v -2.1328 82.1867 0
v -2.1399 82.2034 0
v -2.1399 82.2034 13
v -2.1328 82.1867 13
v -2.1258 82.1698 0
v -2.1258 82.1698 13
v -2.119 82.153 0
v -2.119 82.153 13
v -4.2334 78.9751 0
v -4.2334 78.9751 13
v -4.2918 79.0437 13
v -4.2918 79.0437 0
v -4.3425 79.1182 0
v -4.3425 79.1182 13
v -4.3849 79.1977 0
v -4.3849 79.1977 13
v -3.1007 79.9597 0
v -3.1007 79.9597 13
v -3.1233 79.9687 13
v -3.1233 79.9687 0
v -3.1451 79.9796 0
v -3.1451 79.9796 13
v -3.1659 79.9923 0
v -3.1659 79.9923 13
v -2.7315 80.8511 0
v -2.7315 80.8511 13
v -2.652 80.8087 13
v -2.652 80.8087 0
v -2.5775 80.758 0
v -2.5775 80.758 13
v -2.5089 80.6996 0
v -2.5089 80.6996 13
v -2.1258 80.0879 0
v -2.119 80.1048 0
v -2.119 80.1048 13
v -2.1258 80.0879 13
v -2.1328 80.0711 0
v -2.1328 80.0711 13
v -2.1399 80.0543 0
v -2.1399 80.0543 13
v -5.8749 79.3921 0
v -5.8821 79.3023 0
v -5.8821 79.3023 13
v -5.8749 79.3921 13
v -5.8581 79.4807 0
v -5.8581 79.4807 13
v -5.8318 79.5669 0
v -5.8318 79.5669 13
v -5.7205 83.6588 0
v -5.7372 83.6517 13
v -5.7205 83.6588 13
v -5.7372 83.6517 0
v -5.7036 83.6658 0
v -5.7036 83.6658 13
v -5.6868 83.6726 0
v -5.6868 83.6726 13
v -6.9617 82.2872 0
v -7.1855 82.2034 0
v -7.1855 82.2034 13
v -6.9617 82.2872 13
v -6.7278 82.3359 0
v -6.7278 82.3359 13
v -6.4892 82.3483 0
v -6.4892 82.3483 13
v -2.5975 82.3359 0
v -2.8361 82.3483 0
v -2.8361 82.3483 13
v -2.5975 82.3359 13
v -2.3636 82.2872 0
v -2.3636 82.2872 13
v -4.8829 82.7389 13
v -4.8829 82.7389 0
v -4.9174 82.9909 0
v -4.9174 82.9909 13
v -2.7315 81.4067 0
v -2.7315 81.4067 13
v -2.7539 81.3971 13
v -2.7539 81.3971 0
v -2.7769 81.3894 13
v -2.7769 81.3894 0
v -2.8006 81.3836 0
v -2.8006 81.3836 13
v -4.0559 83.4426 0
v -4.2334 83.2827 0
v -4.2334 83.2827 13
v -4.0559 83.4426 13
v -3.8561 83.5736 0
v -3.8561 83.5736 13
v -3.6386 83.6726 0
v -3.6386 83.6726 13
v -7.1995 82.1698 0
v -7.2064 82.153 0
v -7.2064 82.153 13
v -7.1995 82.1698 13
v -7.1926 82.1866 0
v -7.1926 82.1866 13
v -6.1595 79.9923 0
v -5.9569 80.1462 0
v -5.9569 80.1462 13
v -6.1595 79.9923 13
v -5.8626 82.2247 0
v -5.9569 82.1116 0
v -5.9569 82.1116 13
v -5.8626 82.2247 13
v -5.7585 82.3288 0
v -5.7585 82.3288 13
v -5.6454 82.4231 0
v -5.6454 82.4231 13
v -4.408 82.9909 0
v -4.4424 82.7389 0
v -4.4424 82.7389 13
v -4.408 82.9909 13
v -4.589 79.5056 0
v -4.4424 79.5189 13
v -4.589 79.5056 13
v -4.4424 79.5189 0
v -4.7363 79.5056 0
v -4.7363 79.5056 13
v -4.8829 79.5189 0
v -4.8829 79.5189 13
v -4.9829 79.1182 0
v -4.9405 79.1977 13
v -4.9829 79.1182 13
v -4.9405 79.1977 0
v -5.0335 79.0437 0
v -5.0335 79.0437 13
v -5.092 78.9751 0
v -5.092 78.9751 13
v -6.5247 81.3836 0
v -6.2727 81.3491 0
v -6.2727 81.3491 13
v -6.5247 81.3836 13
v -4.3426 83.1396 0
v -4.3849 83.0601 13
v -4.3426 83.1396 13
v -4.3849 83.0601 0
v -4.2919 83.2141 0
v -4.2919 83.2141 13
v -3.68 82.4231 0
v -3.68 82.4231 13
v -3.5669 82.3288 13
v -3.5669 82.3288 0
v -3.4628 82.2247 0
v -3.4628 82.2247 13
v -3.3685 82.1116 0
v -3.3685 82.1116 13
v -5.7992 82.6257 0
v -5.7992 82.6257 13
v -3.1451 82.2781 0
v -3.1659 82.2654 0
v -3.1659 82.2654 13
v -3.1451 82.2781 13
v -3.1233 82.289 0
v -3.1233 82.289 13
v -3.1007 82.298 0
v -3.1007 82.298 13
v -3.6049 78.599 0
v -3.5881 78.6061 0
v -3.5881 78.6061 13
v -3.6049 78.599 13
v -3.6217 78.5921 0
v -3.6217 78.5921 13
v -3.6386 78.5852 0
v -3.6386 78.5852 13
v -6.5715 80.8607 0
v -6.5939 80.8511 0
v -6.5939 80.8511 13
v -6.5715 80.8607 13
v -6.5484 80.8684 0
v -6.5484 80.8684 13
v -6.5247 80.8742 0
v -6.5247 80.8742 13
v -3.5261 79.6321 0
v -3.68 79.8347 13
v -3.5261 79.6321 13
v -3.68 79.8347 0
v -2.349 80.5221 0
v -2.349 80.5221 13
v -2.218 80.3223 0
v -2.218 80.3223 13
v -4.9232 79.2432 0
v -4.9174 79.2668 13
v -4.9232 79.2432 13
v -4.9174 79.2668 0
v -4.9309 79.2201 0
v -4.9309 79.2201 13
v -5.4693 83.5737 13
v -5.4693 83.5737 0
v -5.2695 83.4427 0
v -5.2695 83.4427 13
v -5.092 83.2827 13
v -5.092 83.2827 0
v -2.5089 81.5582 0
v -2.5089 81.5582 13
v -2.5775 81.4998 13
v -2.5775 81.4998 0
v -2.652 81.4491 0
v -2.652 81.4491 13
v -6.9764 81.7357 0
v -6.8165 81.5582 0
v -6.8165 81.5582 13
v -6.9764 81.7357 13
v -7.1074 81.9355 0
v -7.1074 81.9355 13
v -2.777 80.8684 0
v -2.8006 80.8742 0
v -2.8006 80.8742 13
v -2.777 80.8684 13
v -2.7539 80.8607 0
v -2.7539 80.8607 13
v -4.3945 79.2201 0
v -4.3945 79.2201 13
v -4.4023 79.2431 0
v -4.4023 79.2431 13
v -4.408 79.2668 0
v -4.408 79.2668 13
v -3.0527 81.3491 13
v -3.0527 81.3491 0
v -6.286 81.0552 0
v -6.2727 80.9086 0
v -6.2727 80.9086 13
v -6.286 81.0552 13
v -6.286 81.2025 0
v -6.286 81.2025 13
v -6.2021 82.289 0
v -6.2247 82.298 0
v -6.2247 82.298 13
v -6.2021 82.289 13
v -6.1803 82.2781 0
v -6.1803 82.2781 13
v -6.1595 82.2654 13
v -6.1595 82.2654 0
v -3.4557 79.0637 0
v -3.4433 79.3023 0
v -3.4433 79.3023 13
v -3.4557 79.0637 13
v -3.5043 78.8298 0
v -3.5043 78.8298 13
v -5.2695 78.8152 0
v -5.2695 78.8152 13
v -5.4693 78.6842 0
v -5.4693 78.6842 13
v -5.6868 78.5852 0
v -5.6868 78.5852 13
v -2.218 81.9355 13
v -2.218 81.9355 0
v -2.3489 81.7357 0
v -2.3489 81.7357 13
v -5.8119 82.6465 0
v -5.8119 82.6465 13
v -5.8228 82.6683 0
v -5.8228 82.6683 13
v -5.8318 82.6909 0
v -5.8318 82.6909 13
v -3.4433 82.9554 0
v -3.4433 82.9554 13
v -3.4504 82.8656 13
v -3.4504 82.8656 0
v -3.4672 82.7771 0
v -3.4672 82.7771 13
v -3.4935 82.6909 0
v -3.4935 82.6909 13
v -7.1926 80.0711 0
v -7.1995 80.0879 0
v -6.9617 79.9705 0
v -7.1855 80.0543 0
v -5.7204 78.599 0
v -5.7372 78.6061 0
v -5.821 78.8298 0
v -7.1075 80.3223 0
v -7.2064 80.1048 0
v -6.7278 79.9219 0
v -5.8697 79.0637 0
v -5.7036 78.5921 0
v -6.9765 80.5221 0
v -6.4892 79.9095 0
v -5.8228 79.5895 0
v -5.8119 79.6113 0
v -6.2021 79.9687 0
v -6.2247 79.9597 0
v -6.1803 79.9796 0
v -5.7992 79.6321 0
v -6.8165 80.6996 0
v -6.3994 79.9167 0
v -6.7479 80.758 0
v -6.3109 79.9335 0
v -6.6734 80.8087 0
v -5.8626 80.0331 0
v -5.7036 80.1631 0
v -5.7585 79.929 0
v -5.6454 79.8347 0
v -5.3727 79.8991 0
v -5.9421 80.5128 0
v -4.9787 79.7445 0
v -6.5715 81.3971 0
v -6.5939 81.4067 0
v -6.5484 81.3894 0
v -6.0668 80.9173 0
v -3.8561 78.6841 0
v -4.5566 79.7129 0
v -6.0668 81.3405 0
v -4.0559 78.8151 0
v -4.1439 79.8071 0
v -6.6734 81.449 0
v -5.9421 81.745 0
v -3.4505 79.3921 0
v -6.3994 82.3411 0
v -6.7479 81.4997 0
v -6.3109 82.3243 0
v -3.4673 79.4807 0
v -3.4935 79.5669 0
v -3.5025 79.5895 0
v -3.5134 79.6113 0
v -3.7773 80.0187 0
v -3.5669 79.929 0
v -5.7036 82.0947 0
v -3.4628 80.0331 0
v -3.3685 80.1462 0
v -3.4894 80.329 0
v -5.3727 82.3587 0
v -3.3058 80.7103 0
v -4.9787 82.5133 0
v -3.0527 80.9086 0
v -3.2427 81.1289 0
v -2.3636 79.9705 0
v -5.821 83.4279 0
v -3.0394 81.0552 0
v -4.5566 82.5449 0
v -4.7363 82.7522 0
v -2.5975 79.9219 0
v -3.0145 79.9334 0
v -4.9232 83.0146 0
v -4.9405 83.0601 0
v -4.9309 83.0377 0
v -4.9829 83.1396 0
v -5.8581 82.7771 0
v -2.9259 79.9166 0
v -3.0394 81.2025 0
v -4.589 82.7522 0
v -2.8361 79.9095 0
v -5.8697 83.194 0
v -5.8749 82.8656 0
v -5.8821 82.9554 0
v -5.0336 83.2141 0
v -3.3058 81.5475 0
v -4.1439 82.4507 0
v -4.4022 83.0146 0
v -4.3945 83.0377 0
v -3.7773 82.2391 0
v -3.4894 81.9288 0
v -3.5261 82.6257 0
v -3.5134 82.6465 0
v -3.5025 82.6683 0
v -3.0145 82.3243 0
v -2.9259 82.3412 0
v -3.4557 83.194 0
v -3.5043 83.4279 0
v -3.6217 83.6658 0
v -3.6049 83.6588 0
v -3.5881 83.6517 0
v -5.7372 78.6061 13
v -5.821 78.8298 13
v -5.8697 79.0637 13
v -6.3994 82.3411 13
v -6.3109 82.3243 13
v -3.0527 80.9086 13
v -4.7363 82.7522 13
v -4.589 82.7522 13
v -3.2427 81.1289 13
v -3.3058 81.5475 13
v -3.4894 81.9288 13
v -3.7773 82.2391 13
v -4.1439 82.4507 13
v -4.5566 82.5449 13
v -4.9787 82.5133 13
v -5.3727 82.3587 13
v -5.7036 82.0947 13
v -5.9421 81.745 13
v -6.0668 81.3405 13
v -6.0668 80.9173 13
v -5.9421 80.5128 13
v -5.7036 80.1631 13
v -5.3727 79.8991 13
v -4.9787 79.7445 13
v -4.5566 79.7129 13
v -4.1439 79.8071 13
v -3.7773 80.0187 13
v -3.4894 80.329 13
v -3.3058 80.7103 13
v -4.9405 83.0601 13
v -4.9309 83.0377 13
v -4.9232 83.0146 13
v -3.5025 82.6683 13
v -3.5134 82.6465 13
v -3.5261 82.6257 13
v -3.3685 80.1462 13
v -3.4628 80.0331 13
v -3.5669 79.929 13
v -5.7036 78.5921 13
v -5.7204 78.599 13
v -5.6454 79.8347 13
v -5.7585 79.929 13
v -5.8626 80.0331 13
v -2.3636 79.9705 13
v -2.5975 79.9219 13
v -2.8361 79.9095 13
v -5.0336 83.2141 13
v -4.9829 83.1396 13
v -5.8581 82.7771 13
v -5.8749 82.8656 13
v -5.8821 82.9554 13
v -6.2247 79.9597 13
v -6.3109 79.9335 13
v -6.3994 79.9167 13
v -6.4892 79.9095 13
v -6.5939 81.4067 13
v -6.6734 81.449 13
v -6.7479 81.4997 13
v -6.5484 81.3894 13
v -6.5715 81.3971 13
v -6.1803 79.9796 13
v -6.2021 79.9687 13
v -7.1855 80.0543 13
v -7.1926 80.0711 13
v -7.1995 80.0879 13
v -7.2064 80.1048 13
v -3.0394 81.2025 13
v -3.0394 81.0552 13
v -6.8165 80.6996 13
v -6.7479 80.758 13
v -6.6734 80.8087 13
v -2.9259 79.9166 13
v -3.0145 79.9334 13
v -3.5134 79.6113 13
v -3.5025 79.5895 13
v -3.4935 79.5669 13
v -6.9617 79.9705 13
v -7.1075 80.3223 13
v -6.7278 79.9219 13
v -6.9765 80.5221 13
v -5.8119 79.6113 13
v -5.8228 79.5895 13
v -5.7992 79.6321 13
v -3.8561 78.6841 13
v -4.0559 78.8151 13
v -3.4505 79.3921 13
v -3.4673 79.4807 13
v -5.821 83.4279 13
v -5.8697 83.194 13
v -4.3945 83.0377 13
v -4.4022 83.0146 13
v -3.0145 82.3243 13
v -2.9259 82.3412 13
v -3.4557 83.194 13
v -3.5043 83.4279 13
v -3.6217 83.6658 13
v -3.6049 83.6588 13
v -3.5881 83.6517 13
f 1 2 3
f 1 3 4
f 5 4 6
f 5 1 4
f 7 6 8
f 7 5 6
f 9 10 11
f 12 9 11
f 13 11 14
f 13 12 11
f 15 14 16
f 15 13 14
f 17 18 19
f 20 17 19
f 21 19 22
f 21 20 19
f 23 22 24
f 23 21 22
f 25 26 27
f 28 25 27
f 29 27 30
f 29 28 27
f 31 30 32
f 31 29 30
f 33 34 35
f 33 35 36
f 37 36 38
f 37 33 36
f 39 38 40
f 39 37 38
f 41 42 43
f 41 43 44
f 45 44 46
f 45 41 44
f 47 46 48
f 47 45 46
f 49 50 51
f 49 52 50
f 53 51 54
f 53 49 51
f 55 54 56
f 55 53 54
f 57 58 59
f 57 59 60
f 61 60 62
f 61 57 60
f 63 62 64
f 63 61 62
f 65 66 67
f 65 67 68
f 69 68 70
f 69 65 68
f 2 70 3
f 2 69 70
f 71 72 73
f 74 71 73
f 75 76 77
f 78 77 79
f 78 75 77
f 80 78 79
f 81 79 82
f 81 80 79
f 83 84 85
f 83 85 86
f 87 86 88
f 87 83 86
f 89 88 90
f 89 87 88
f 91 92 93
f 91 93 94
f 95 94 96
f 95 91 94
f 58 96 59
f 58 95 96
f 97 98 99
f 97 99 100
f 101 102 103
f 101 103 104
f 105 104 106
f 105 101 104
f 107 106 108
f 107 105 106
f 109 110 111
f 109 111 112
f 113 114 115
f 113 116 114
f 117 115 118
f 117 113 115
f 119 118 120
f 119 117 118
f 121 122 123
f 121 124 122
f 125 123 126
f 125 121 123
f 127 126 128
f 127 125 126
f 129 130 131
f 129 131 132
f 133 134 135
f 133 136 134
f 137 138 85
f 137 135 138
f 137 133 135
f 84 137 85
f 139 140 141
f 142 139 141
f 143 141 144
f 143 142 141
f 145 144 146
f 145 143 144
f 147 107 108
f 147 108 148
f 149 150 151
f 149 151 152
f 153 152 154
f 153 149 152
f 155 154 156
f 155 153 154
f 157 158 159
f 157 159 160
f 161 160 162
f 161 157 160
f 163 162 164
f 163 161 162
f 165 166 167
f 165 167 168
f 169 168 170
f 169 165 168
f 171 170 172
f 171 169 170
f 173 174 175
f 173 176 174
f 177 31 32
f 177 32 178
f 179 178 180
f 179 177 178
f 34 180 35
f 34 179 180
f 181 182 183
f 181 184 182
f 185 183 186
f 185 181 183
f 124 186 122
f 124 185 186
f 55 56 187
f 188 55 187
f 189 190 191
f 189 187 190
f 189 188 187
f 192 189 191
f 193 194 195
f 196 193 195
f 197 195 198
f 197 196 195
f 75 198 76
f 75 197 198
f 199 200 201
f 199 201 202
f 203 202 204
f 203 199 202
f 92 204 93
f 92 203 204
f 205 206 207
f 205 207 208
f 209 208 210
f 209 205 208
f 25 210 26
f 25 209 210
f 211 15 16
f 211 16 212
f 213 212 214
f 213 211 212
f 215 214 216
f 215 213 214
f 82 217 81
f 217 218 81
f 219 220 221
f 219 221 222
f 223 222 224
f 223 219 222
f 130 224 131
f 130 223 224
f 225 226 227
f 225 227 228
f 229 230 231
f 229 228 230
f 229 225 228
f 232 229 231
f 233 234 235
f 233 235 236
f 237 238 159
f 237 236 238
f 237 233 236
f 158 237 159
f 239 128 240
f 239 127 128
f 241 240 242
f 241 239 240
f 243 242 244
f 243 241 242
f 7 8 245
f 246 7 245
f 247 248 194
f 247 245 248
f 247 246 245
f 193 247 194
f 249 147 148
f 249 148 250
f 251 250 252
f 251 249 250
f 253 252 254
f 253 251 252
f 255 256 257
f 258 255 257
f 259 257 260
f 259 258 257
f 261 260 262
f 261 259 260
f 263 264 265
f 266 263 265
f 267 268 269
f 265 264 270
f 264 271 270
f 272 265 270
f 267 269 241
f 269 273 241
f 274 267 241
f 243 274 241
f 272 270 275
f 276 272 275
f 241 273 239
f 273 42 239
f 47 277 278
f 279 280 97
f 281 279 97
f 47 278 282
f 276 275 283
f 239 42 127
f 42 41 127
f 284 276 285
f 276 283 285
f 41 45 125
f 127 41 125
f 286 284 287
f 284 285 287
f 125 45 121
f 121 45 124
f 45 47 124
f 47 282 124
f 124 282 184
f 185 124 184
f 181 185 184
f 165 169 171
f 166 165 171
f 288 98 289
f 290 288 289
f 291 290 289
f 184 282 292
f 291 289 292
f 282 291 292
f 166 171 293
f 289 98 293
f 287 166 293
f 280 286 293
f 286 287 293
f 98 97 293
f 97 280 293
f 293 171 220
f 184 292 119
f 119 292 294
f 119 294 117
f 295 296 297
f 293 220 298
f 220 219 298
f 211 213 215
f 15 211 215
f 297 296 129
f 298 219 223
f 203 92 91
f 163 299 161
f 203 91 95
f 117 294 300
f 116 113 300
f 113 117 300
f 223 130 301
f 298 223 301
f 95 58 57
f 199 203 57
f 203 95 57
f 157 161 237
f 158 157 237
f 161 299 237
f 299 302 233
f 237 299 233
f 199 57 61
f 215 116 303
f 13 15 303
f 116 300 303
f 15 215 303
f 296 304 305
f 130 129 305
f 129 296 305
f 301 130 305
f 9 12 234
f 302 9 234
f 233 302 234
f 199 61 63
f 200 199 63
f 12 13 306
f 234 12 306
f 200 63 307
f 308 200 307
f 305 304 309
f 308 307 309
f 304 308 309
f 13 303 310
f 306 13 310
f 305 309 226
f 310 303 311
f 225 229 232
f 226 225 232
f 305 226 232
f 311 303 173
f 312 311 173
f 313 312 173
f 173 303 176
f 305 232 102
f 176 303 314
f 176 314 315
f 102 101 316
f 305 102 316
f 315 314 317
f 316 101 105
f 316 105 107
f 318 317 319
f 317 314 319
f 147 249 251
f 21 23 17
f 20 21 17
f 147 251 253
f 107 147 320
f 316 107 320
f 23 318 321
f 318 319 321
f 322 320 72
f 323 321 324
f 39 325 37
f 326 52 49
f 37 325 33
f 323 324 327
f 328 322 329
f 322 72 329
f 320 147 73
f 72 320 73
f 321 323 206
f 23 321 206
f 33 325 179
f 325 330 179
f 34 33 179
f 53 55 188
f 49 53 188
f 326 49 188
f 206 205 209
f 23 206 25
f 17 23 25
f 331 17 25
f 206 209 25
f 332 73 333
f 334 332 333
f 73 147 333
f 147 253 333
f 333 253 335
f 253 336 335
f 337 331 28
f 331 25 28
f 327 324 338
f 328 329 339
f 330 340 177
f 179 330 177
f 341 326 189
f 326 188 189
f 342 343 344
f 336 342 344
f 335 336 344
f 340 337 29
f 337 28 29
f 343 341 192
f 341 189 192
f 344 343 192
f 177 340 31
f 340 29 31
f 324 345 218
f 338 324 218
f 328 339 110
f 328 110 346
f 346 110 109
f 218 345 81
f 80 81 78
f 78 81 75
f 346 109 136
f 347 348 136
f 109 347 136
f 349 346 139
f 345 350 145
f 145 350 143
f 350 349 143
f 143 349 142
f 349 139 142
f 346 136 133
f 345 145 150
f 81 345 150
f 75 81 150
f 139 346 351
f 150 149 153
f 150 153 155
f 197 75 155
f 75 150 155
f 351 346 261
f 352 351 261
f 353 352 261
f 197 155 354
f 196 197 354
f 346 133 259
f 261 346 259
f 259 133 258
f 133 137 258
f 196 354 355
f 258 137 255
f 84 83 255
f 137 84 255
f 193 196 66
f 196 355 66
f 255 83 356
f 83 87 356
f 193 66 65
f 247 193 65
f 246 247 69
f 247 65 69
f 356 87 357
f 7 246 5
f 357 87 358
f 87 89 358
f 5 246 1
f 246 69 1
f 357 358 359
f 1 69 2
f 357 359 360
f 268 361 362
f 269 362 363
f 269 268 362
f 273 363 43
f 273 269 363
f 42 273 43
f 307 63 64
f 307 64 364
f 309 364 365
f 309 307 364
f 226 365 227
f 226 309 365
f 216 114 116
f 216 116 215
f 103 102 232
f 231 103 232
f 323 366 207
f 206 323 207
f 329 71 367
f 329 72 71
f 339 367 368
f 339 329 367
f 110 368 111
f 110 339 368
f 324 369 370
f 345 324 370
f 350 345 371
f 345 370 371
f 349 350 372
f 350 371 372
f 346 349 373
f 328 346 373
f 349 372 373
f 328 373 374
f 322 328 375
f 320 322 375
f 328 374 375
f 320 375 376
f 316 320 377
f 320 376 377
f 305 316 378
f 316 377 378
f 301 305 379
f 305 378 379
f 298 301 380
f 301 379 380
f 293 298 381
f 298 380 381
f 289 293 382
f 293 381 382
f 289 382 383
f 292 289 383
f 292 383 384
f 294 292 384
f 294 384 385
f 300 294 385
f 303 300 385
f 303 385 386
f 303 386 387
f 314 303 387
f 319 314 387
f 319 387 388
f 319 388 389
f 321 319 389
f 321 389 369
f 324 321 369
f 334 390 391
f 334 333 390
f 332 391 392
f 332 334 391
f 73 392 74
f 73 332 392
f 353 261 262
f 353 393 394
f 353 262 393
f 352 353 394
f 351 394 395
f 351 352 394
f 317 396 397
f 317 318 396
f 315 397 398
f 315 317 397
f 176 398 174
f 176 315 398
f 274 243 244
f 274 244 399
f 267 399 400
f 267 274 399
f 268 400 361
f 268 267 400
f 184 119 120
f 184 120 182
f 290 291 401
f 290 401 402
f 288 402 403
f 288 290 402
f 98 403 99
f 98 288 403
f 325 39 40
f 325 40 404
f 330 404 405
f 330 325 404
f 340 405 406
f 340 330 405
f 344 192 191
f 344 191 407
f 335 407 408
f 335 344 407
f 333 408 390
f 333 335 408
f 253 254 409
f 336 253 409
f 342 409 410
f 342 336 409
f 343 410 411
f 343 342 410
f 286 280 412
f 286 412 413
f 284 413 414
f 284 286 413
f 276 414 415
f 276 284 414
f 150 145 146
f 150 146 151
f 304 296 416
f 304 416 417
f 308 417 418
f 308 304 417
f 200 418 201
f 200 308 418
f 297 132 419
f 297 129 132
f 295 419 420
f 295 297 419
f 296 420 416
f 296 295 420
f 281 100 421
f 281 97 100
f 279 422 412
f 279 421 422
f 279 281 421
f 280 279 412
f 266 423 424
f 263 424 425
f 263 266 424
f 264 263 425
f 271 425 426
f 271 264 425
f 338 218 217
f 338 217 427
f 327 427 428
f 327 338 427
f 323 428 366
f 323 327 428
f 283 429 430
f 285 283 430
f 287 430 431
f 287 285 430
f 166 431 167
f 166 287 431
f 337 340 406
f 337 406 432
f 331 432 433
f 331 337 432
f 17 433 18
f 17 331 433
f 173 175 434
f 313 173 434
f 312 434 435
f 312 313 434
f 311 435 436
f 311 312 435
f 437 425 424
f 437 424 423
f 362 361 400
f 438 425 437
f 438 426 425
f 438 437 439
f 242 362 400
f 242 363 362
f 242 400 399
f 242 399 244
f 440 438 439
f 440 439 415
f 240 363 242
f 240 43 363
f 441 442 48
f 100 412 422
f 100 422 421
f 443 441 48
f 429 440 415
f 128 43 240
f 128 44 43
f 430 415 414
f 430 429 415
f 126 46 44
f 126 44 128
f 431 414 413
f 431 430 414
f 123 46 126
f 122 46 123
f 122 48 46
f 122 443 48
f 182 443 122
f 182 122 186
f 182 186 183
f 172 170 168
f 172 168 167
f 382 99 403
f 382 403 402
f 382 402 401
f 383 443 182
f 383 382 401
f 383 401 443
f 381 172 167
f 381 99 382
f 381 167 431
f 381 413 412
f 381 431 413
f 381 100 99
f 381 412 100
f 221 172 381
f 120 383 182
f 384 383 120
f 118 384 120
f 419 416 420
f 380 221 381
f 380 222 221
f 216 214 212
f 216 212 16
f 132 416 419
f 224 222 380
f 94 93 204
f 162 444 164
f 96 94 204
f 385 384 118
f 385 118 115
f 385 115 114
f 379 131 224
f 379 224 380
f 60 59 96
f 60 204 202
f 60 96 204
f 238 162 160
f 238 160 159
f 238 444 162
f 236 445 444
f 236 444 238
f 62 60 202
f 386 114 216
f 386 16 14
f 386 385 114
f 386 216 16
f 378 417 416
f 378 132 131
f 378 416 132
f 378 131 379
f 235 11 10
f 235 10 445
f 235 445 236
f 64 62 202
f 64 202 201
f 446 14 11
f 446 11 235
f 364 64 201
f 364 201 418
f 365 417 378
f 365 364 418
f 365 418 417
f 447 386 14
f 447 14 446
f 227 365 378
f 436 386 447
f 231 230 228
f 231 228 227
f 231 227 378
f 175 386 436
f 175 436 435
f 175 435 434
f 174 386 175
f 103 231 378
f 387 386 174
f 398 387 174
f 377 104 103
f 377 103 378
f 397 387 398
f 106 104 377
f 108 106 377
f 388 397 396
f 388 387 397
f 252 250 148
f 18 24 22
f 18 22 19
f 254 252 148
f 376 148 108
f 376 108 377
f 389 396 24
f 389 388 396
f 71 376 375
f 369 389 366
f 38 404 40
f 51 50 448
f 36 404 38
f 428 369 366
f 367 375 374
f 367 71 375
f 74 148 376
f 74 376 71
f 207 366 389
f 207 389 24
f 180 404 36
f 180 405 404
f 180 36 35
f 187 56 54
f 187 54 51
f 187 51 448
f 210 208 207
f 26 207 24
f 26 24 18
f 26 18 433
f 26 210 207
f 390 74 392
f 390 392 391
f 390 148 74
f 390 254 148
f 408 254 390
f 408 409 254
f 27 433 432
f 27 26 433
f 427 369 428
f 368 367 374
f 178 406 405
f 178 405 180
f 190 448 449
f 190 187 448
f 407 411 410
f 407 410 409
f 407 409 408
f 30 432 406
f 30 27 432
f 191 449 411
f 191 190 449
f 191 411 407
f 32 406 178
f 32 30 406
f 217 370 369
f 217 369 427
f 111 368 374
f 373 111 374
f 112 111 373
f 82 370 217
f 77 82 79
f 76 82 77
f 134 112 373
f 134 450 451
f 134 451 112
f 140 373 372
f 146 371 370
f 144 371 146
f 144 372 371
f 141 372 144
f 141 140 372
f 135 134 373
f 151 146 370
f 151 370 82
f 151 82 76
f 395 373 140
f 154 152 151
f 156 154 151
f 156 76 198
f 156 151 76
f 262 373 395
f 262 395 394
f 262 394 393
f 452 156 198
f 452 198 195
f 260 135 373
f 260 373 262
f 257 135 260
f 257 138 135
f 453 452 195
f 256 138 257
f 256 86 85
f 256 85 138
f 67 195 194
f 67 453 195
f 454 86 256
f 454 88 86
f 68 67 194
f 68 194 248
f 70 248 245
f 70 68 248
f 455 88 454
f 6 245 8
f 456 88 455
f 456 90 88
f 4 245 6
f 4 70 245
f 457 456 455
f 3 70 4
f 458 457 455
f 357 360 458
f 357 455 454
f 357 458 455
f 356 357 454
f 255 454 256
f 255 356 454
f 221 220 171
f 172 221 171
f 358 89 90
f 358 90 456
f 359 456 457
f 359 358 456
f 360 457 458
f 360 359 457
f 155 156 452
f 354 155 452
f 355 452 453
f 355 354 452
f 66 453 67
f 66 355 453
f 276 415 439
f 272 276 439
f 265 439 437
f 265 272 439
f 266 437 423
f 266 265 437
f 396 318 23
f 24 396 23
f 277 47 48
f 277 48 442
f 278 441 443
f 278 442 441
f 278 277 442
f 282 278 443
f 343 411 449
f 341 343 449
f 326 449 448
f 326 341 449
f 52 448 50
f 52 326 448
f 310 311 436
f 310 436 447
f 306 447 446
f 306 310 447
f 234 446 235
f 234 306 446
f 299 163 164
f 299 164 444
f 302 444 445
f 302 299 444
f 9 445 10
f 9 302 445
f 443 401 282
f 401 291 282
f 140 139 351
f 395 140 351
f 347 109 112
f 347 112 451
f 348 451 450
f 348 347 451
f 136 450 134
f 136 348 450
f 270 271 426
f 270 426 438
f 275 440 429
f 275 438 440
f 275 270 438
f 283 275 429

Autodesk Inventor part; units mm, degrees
ref_plane "YZ Plane" through (0, 0, 0) normal (1, 0, 0) x (0, 1, 0)
ref_plane "XZ Plane" through (0, 0, 0) normal (0, 1, 0) x (-1, 0, 0)
ref_plane "XY Plane" through (0, 0, 0) normal (0, 0, 1) x (1, 0, 0)
sketch "スケッチ1" plane through (0, 0, 0) normal (0, 0, 1) x (1, 0, 0)
  arc A0 (-4.3849, 83.0601) -> (-4.408, 82.9909) centre (-4.1206, 82.9335) ccw
  arc A1 (-4.2334, 83.2827) -> (-4.3849, 83.0601) centre (-3.6288, 82.7082) ccw
  arc A2 (-3.6386, 83.6726) -> (-4.2334, 83.2827) centre (-3.1026, 82.2065) ccw
  arc A3 (-5.8318, 82.6909) -> (-5.7992, 82.6257) centre (-5.5555, 82.7883) ccw
  arc A4 (-5.8821, 82.9554) -> (-5.8318, 82.6909) centre (-5.0484, 82.9767) ccw
  arc A5 (-5.7372, 83.6517) -> (-5.8821, 82.9554) centre (-4.3215, 82.994) ccw
  arc A6 (-6.5939, 81.4067) -> (-6.5247, 81.3836) centre (-6.4673, 81.6709) ccw
  arc A7 (-6.8165, 81.5582) -> (-6.5939, 81.4067) centre (-6.242, 82.1627) ccw
  arc A8 (-7.2064, 82.153) -> (-6.8165, 81.5582) centre (-5.7403, 82.6889) ccw
  arc A9 (-6.2247, 79.9597) -> (-6.1595, 79.9923) centre (-6.3221, 80.2361) ccw
  arc A10 (-6.4892, 79.9095) -> (-6.2247, 79.9597) centre (-6.5105, 80.7432) ccw
  arc A11 (-7.1855, 80.0543) -> (-6.4892, 79.9095) centre (-6.5278, 81.4701) ccw
  arc A12 (-4.9405, 79.1977) -> (-4.9174, 79.2668) centre (-5.2047, 79.3242) ccw
  arc A13 (-5.092, 78.9751) -> (-4.9405, 79.1977) centre (-5.6965, 79.5495) ccw
  arc A14 (-5.6868, 78.5852) -> (-5.092, 78.9751) centre (-6.2228, 80.0513) ccw
  arc A15 (-3.4935, 79.5669) -> (-3.5261, 79.6321) centre (-3.7699, 79.4695) ccw
  arc A16 (-3.4433, 79.3023) -> (-3.4935, 79.5669) centre (-4.277, 79.2811) ccw
  arc A17 (-3.5881, 78.6061) -> (-3.4433, 79.3023) centre (-5.0039, 79.2638) ccw
  arc A18 (-2.7315, 80.8511) -> (-2.8006, 80.8742) centre (-2.858, 80.5868) ccw
  arc A19 (-2.5089, 80.6996) -> (-2.7315, 80.8511) centre (-3.0833, 80.095) ccw
  arc A20 (-2.119, 80.1048) -> (-2.5089, 80.6996) centre (-3.5851, 79.5688) ccw
  arc A21 (-3.1007, 82.298) -> (-3.1659, 82.2654) centre (-3.0033, 82.0217) ccw
  arc A22 (-2.8361, 82.3483) -> (-3.1007, 82.298) centre (-2.8149, 81.5146) ccw
  arc A23 (-2.1399, 82.2034) -> (-2.8361, 82.3483) centre (-2.7976, 80.7877) ccw
  arc A24 (-4.9174, 82.9909) -> (-4.9405, 83.0601) centre (-5.2047, 82.9335) ccw
  arc A25 (-4.9405, 83.0601) -> (-5.092, 83.2827) centre (-5.6965, 82.7082) ccw
  arc A26 (-5.092, 83.2827) -> (-5.6868, 83.6726) centre (-6.2228, 82.2065) ccw
  arc A27 (-6.1595, 82.2654) -> (-6.2247, 82.298) centre (-6.3221, 82.0217) ccw
  arc A28 (-6.2247, 82.298) -> (-6.4892, 82.3483) centre (-6.5105, 81.5146) ccw
  arc A29 (-6.4892, 82.3483) -> (-7.1855, 82.2034) centre (-6.5278, 80.7877) ccw
  arc A30 (-6.5247, 80.8742) -> (-6.5939, 80.8511) centre (-6.4673, 80.5868) ccw
  arc A31 (-6.5939, 80.8511) -> (-6.8165, 80.6996) centre (-6.242, 80.095) ccw
  arc A32 (-6.8165, 80.6996) -> (-7.2064, 80.1048) centre (-5.7403, 79.5688) ccw
  arc A33 (-5.7992, 79.6321) -> (-5.8318, 79.5669) centre (-5.5555, 79.4695) ccw
  arc A34 (-5.8318, 79.5669) -> (-5.8821, 79.3023) centre (-5.0484, 79.2811) ccw
  arc A35 (-5.8821, 79.3023) -> (-5.7372, 78.6061) centre (-4.3215, 79.2638) ccw
  arc A36 (-4.408, 79.2668) -> (-4.3849, 79.1977) centre (-4.1206, 79.3242) ccw
  arc A37 (-4.3849, 79.1977) -> (-4.2334, 78.9751) centre (-3.6288, 79.5495) ccw
  arc A38 (-4.2334, 78.9751) -> (-3.6386, 78.5852) centre (-3.1026, 80.0513) ccw
  arc A39 (-3.1659, 79.9923) -> (-3.1007, 79.9597) centre (-3.0033, 80.2361) ccw
  arc A40 (-3.1007, 79.9597) -> (-2.8361, 79.9095) centre (-2.8149, 80.7432) ccw
  arc A41 (-2.8361, 79.9095) -> (-2.1399, 80.0543) centre (-2.7976, 81.4701) ccw
  arc A42 (-2.8006, 81.3836) -> (-2.7315, 81.4067) centre (-2.858, 81.6709) ccw
  arc A43 (-2.7315, 81.4067) -> (-2.5089, 81.5582) centre (-3.0833, 82.1627) ccw
  arc A44 (-2.5089, 81.5582) -> (-2.119, 82.153) centre (-3.5851, 82.6889) ccw
  arc A45 (-3.5261, 82.6257) -> (-3.4935, 82.6909) centre (-3.7699, 82.7883) ccw
  arc A46 (-3.4935, 82.6909) -> (-3.4433, 82.9554) centre (-4.277, 82.9767) ccw
  arc A47 (-3.4433, 82.9554) -> (-3.5881, 83.6517) centre (-5.0039, 82.994) ccw
  arc A48 (-4.4424, 82.7389) -> (-4.8829, 82.7389) centre (-4.6627, 81.1289) ccw
  arc A49 (-5.6454, 82.4231) -> (-5.9569, 82.1116) centre (-4.6627, 81.1289) ccw
  arc A50 (-6.2727, 81.3491) -> (-6.2727, 80.9086) centre (-4.6627, 81.1289) ccw
  arc A51 (-5.9569, 80.1462) -> (-5.6454, 79.8347) centre (-4.6627, 81.1289) ccw
  arc A52 (-4.8829, 79.5189) -> (-4.4424, 79.5189) centre (-4.6627, 81.1289) ccw
  arc A53 (-3.68, 79.8347) -> (-3.3685, 80.1462) centre (-4.6627, 81.1289) ccw
  arc A54 (-3.0527, 80.9086) -> (-3.0527, 81.3491) centre (-4.6627, 81.1289) ccw
  arc A55 (-3.3685, 82.1116) -> (-3.68, 82.4231) centre (-4.6627, 81.1289) ccw
  arc A56 (-5.6868, 83.6726) -> (-5.7372, 83.6517) centre (-4.6627, 81.1289) ccw
  arc A57 (-7.1855, 82.2034) -> (-7.2064, 82.153) centre (-4.6627, 81.1289) ccw
  arc A58 (-7.2064, 80.1048) -> (-7.1855, 80.0543) centre (-4.6627, 81.1289) ccw
  arc A59 (-5.7372, 78.6061) -> (-5.6868, 78.5852) centre (-4.6627, 81.1289) ccw
  arc A60 (-3.6386, 78.5852) -> (-3.5881, 78.6061) centre (-4.6627, 81.1289) ccw
  arc A61 (-2.1399, 80.0543) -> (-2.119, 80.1048) centre (-4.6627, 81.1289) ccw
  arc A62 (-2.119, 82.153) -> (-2.1399, 82.2034) centre (-4.6627, 81.1289) ccw
  arc A63 (-3.5881, 83.6517) -> (-3.6386, 83.6726) centre (-4.6627, 81.1289) ccw
  line L0 (-4.4424, 82.7389) -> (-4.408, 82.9909)
  line L1 (-5.6454, 82.4231) -> (-5.7992, 82.6257)
  line L2 (-6.2727, 81.3491) -> (-6.5247, 81.3836)
  line L3 (-5.9569, 80.1462) -> (-6.1595, 79.9923)
  line L4 (-4.8829, 79.5189) -> (-4.9174, 79.2668)
  line L5 (-3.68, 79.8347) -> (-3.5261, 79.6321)
  line L6 (-3.0527, 80.9086) -> (-2.8006, 80.8742)
  line L7 (-3.3685, 82.1116) -> (-3.1659, 82.2654)
  line L8 (-4.8829, 82.7389) -> (-4.9174, 82.9909)
  line L9 (-5.9569, 82.1116) -> (-6.1595, 82.2654)
  line L10 (-6.2727, 80.9086) -> (-6.5247, 80.8742)
  line L11 (-5.6454, 79.8347) -> (-5.7992, 79.6321)
  line L12 (-4.4424, 79.5189) -> (-4.408, 79.2668)
  line L13 (-3.3685, 80.1462) -> (-3.1659, 79.9923)
  line L14 (-3.0527, 81.3491) -> (-2.8006, 81.3836)
  line L15 (-3.68, 82.4231) -> (-3.5261, 82.6257)
  line L16 (-9.4048, 81.1289) -> (0.0794, 81.1289)
  line L17 (-4.6627, 76.3867) -> (-4.6627, 85.871)
  line L18 (18.0795, 83.871) -> (88.0795, 83.871)
  line L19 (18.0795, 75.871) -> (88.0795, 75.871)
  line L20 (18.0795, 67.871) -> (88.0795, 67.871)
  line L21 (18.0795, 59.871) -> (88.0795, 59.871)
  line L22 (18.0795, 51.871) -> (88.0795, 51.871)
  line L23 (18.0795, 43.871) -> (88.0795, 43.871)
  line L24 (18.0795, 35.871) -> (88.0795, 35.871)
  line L25 (18.0795, 27.871) -> (88.0795, 27.871)
  line L26 (18.0795, 19.871) -> (88.0795, 19.871)
  line L27 (18.0795, 11.871) -> (88.0795, 11.871)
  line L28 (18.0795, 3.871) -> (88.0795, 3.871)
  line L29 (18.0795, -4.129) -> (88.0795, -4.129)
  line L30 (18.0795, -12.129) -> (88.0795, -12.129)
  line L31 (18.0795, 83.871) -> (18.0795, -12.129)
  line L32 (88.0795, 83.871) -> (88.0795, -12.129)
  line L33 (53.0795, 75.871) -> (53.0795, -12.129)
  point P0 (0, 0)
  point P1 (24.0795, 77.871)
  point P2 (26.5795, 69.871)
  point P3 (26.5795, 61.871)
  point P4 (24.0795, 53.871)
  point P5 (26.5795, 45.871)
  point P6 (21.5795, 37.871)
  point P7 (24.0795, 29.871)
  point P8 (24.0795, 21.871)
  point P9 (24.0795, 13.871)
  point P10 (26.5795, 5.871)
  point P11 (26.5795, -2.129)
  point P12 (24.0795, -10.129)
  point P13 (54.0795, 69.871)
  point P14 (70.3295, 61.871)
  point P15 (67.8295, 53.871)
  point P16 (66.5795, 45.871)
  point P17 (70.3295, 37.871)
  point P18 (64.0795, 29.871)
  point P19 (64.0795, 21.871)
  point P20 (66.5795, 13.871)
  point P21 (64.0795, 5.871)
  point P22 (-3.6627, 99.371)
  point P23 (-3.6627, 93.371)
  point P24 (14.6498, 99.371)
  point P25 (15.7123, 93.371)
extrude "押し出し1" add sketch "スケッチ1" along normal blind 13 contours A1 A2 A63 A47 A46 A45 L15 A55 L7 A21 A22 A23 A62 A44 A43 A42 L14 A54 L16 L17 A48 L0 A0 | L17 L16 A50 L2 A6 A7 A8 A57 A29 A28 A27 L9 A49 L1 A3 A4 A5 A56 A26 A25 A24 L8 A48 | L17 A52 L4 A12 A13 A14 A59 A35 A34 A33 L11 A51 L3 A9 A10 A11 A58 A32 A31 A30 L10 A50 L16 | L16 A54 L6 A18 A19 A20 A61 A41 A40 A39 L13 A53 L5 A15 A16 A17 A60 A38 A37 A36 L12 A52 L17
sketch "スケッチ2" plane through (0, 0, 13) normal (0, 0, 1) x (1, 0, 0)
  arc A0 (-4.3849, 83.0601) -> (-4.408, 82.9909) centre (-4.1206, 82.9335) ccw construction
  line L0 (-4.408, 82.9909) -> (-4.4424, 82.7389) construction
  arc A1 (-4.4424, 82.7389) -> (-4.8829, 82.7389) centre (-4.6627, 81.1289) ccw construction
  line L1 (-4.8829, 82.7389) -> (-4.9174, 82.9909) construction
  arc A2 (-4.9174, 82.9909) -> (-4.9405, 83.0601) centre (-5.2047, 82.9335) ccw construction
  arc A3 (-4.9405, 83.0601) -> (-5.092, 83.2827) centre (-5.6965, 82.7082) ccw construction
  arc A4 (-5.092, 83.2827) -> (-5.6868, 83.6726) centre (-6.2228, 82.2065) ccw construction
  arc A5 (-5.6868, 83.6726) -> (-5.7372, 83.6517) centre (-4.6627, 81.1289) ccw construction
  arc A6 (-5.7372, 83.6517) -> (-5.8821, 82.9554) centre (-4.3215, 82.994) ccw construction
  arc A7 (-5.8821, 82.9554) -> (-5.8318, 82.6909) centre (-5.0484, 82.9767) ccw construction
  arc A8 (-5.8318, 82.6909) -> (-5.7992, 82.6257) centre (-5.5555, 82.7883) ccw construction
  line L2 (-5.7992, 82.6257) -> (-5.6454, 82.4231) construction
  arc A9 (-5.6454, 82.4231) -> (-5.9569, 82.1116) centre (-4.6627, 81.1289) ccw construction
  line L3 (-5.9569, 82.1116) -> (-6.1595, 82.2654) construction
  arc A10 (-6.1595, 82.2654) -> (-6.2247, 82.298) centre (-6.3221, 82.0217) ccw construction
  arc A11 (-6.2247, 82.298) -> (-6.4892, 82.3483) centre (-6.5105, 81.5146) ccw construction
  arc A12 (-6.4892, 82.3483) -> (-7.1855, 82.2034) centre (-6.5278, 80.7877) ccw construction
  arc A13 (-7.1855, 82.2034) -> (-7.2064, 82.153) centre (-4.6627, 81.1289) ccw construction
  arc A14 (-7.2064, 82.153) -> (-6.8165, 81.5582) centre (-5.7403, 82.6889) ccw construction
  arc A15 (-6.8165, 81.5582) -> (-6.5939, 81.4067) centre (-6.242, 82.1627) ccw construction
  arc A16 (-6.5939, 81.4067) -> (-6.5247, 81.3836) centre (-6.4673, 81.6709) ccw construction
  line L4 (-6.5247, 81.3836) -> (-6.2727, 81.3491) construction
  arc A17 (-6.2727, 81.3491) -> (-6.2727, 80.9086) centre (-4.6627, 81.1289) ccw construction
  line L5 (-6.2727, 80.9086) -> (-6.5247, 80.8742) construction
  arc A18 (-6.5247, 80.8742) -> (-6.5939, 80.8511) centre (-6.4673, 80.5868) ccw construction
  arc A19 (-6.5939, 80.8511) -> (-6.8165, 80.6996) centre (-6.242, 80.095) ccw construction
  arc A20 (-6.8165, 80.6996) -> (-7.2064, 80.1048) centre (-5.7403, 79.5688) ccw construction
  arc A21 (-7.2064, 80.1048) -> (-7.1855, 80.0543) centre (-4.6627, 81.1289) ccw construction
  arc A22 (-7.1855, 80.0543) -> (-6.4892, 79.9095) centre (-6.5278, 81.4701) ccw construction
  arc A23 (-6.4892, 79.9095) -> (-6.2247, 79.9597) centre (-6.5105, 80.7432) ccw construction
  arc A24 (-6.2247, 79.9597) -> (-6.1595, 79.9923) centre (-6.3221, 80.2361) ccw construction
  line L6 (-6.1595, 79.9923) -> (-5.9569, 80.1462) construction
  arc A25 (-5.9569, 80.1462) -> (-5.6454, 79.8347) centre (-4.6627, 81.1289) ccw construction
  line L7 (-5.6454, 79.8347) -> (-5.7992, 79.6321) construction
  arc A26 (-5.7992, 79.6321) -> (-5.8318, 79.5669) centre (-5.5555, 79.4695) ccw construction
  arc A27 (-5.8318, 79.5669) -> (-5.8821, 79.3023) centre (-5.0484, 79.2811) ccw construction
  arc A28 (-5.8821, 79.3023) -> (-5.7372, 78.6061) centre (-4.3215, 79.2638) ccw construction
  arc A29 (-5.7372, 78.6061) -> (-5.6868, 78.5852) centre (-4.6627, 81.1289) ccw construction
  arc A30 (-5.6868, 78.5852) -> (-5.092, 78.9751) centre (-6.2228, 80.0513) ccw construction
  arc A31 (-5.092, 78.9751) -> (-4.9405, 79.1977) centre (-5.6965, 79.5495) ccw construction
  arc A32 (-4.9405, 79.1977) -> (-4.9174, 79.2668) centre (-5.2047, 79.3242) ccw construction
  line L8 (-4.9174, 79.2668) -> (-4.8829, 79.5189) construction
  arc A33 (-4.8829, 79.5189) -> (-4.4424, 79.5189) centre (-4.6627, 81.1289) ccw construction
  line L9 (-4.4424, 79.5189) -> (-4.408, 79.2668) construction
  arc A34 (-4.408, 79.2668) -> (-4.3849, 79.1977) centre (-4.1206, 79.3242) ccw construction
  arc A35 (-4.3849, 79.1977) -> (-4.2334, 78.9751) centre (-3.6288, 79.5495) ccw construction
  arc A36 (-4.2334, 78.9751) -> (-3.6386, 78.5852) centre (-3.1026, 80.0513) ccw construction
  arc A37 (-3.6386, 78.5852) -> (-3.5881, 78.6061) centre (-4.6627, 81.1289) ccw construction
  arc A38 (-3.5881, 78.6061) -> (-3.4433, 79.3023) centre (-5.0039, 79.2638) ccw construction
  arc A39 (-3.4433, 79.3023) -> (-3.4935, 79.5669) centre (-4.277, 79.2811) ccw construction
  arc A40 (-3.4935, 79.5669) -> (-3.5261, 79.6321) centre (-3.7699, 79.4695) ccw construction
  line L10 (-3.5261, 79.6321) -> (-3.68, 79.8347) construction
  arc A41 (-3.68, 79.8347) -> (-3.3685, 80.1462) centre (-4.6627, 81.1289) ccw construction
  line L11 (-3.3685, 80.1462) -> (-3.1659, 79.9923) construction
  arc A42 (-3.1659, 79.9923) -> (-3.1007, 79.9597) centre (-3.0033, 80.2361) ccw construction
  arc A43 (-3.1007, 79.9597) -> (-2.8361, 79.9095) centre (-2.8149, 80.7432) ccw construction
  arc A44 (-2.8361, 79.9095) -> (-2.1399, 80.0543) centre (-2.7976, 81.4701) ccw construction
  arc A45 (-2.1399, 80.0543) -> (-2.119, 80.1048) centre (-4.6627, 81.1289) ccw construction
  arc A46 (-2.119, 80.1048) -> (-2.5089, 80.6996) centre (-3.5851, 79.5688) ccw construction
  arc A47 (-2.5089, 80.6996) -> (-2.7315, 80.8511) centre (-3.0833, 80.095) ccw construction
  arc A48 (-2.7315, 80.8511) -> (-2.8006, 80.8742) centre (-2.858, 80.5868) ccw construction
  line L12 (-2.8006, 80.8742) -> (-3.0527, 80.9086) construction
  arc A49 (-3.0527, 80.9086) -> (-3.0527, 81.3491) centre (-4.6627, 81.1289) ccw construction
  line L13 (-3.0527, 81.3491) -> (-2.8006, 81.3836) construction
  arc A50 (-2.8006, 81.3836) -> (-2.7315, 81.4067) centre (-2.858, 81.6709) ccw construction
  arc A51 (-2.7315, 81.4067) -> (-2.5089, 81.5582) centre (-3.0833, 82.1627) ccw construction
  arc A52 (-2.5089, 81.5582) -> (-2.119, 82.153) centre (-3.5851, 82.6889) ccw construction
  arc A53 (-2.119, 82.153) -> (-2.1399, 82.2034) centre (-4.6627, 81.1289) ccw construction
  arc A54 (-2.1399, 82.2034) -> (-2.8361, 82.3483) centre (-2.7976, 80.7877) ccw construction
  arc A55 (-2.8361, 82.3483) -> (-3.1007, 82.298) centre (-2.8149, 81.5146) ccw construction
  arc A56 (-3.1007, 82.298) -> (-3.1659, 82.2654) centre (-3.0033, 82.0217) ccw construction
  line L14 (-3.1659, 82.2654) -> (-3.3685, 82.1116) construction
  arc A57 (-3.3685, 82.1116) -> (-3.68, 82.4231) centre (-4.6627, 81.1289) ccw construction
  line L15 (-3.68, 82.4231) -> (-3.5261, 82.6257) construction
  arc A58 (-3.5261, 82.6257) -> (-3.4935, 82.6909) centre (-3.7699, 82.7883) ccw construction
  arc A59 (-3.4935, 82.6909) -> (-3.4433, 82.9554) centre (-4.277, 82.9767) ccw construction
  arc A60 (-3.4433, 82.9554) -> (-3.5881, 83.6517) centre (-5.0039, 82.994) ccw construction
  arc A61 (-3.5881, 83.6517) -> (-3.6386, 83.6726) centre (-4.6627, 81.1289) ccw construction
  arc A62 (-3.6386, 83.6726) -> (-4.2334, 83.2827) centre (-3.1026, 82.2065) ccw construction
  arc A63 (-4.2334, 83.2827) -> (-4.3849, 83.0601) centre (-3.6288, 82.7082) ccw construction
  circle A64 centre (-4.6627, 81.1289) radius 1.42
  point P0 (0, 0)
  dimension "d2" = 2.84
extrude "押し出し2" cut sketch "スケッチ2" against normal through all
properties part number "ピニオン8" material "鋼、炭素鋼"
